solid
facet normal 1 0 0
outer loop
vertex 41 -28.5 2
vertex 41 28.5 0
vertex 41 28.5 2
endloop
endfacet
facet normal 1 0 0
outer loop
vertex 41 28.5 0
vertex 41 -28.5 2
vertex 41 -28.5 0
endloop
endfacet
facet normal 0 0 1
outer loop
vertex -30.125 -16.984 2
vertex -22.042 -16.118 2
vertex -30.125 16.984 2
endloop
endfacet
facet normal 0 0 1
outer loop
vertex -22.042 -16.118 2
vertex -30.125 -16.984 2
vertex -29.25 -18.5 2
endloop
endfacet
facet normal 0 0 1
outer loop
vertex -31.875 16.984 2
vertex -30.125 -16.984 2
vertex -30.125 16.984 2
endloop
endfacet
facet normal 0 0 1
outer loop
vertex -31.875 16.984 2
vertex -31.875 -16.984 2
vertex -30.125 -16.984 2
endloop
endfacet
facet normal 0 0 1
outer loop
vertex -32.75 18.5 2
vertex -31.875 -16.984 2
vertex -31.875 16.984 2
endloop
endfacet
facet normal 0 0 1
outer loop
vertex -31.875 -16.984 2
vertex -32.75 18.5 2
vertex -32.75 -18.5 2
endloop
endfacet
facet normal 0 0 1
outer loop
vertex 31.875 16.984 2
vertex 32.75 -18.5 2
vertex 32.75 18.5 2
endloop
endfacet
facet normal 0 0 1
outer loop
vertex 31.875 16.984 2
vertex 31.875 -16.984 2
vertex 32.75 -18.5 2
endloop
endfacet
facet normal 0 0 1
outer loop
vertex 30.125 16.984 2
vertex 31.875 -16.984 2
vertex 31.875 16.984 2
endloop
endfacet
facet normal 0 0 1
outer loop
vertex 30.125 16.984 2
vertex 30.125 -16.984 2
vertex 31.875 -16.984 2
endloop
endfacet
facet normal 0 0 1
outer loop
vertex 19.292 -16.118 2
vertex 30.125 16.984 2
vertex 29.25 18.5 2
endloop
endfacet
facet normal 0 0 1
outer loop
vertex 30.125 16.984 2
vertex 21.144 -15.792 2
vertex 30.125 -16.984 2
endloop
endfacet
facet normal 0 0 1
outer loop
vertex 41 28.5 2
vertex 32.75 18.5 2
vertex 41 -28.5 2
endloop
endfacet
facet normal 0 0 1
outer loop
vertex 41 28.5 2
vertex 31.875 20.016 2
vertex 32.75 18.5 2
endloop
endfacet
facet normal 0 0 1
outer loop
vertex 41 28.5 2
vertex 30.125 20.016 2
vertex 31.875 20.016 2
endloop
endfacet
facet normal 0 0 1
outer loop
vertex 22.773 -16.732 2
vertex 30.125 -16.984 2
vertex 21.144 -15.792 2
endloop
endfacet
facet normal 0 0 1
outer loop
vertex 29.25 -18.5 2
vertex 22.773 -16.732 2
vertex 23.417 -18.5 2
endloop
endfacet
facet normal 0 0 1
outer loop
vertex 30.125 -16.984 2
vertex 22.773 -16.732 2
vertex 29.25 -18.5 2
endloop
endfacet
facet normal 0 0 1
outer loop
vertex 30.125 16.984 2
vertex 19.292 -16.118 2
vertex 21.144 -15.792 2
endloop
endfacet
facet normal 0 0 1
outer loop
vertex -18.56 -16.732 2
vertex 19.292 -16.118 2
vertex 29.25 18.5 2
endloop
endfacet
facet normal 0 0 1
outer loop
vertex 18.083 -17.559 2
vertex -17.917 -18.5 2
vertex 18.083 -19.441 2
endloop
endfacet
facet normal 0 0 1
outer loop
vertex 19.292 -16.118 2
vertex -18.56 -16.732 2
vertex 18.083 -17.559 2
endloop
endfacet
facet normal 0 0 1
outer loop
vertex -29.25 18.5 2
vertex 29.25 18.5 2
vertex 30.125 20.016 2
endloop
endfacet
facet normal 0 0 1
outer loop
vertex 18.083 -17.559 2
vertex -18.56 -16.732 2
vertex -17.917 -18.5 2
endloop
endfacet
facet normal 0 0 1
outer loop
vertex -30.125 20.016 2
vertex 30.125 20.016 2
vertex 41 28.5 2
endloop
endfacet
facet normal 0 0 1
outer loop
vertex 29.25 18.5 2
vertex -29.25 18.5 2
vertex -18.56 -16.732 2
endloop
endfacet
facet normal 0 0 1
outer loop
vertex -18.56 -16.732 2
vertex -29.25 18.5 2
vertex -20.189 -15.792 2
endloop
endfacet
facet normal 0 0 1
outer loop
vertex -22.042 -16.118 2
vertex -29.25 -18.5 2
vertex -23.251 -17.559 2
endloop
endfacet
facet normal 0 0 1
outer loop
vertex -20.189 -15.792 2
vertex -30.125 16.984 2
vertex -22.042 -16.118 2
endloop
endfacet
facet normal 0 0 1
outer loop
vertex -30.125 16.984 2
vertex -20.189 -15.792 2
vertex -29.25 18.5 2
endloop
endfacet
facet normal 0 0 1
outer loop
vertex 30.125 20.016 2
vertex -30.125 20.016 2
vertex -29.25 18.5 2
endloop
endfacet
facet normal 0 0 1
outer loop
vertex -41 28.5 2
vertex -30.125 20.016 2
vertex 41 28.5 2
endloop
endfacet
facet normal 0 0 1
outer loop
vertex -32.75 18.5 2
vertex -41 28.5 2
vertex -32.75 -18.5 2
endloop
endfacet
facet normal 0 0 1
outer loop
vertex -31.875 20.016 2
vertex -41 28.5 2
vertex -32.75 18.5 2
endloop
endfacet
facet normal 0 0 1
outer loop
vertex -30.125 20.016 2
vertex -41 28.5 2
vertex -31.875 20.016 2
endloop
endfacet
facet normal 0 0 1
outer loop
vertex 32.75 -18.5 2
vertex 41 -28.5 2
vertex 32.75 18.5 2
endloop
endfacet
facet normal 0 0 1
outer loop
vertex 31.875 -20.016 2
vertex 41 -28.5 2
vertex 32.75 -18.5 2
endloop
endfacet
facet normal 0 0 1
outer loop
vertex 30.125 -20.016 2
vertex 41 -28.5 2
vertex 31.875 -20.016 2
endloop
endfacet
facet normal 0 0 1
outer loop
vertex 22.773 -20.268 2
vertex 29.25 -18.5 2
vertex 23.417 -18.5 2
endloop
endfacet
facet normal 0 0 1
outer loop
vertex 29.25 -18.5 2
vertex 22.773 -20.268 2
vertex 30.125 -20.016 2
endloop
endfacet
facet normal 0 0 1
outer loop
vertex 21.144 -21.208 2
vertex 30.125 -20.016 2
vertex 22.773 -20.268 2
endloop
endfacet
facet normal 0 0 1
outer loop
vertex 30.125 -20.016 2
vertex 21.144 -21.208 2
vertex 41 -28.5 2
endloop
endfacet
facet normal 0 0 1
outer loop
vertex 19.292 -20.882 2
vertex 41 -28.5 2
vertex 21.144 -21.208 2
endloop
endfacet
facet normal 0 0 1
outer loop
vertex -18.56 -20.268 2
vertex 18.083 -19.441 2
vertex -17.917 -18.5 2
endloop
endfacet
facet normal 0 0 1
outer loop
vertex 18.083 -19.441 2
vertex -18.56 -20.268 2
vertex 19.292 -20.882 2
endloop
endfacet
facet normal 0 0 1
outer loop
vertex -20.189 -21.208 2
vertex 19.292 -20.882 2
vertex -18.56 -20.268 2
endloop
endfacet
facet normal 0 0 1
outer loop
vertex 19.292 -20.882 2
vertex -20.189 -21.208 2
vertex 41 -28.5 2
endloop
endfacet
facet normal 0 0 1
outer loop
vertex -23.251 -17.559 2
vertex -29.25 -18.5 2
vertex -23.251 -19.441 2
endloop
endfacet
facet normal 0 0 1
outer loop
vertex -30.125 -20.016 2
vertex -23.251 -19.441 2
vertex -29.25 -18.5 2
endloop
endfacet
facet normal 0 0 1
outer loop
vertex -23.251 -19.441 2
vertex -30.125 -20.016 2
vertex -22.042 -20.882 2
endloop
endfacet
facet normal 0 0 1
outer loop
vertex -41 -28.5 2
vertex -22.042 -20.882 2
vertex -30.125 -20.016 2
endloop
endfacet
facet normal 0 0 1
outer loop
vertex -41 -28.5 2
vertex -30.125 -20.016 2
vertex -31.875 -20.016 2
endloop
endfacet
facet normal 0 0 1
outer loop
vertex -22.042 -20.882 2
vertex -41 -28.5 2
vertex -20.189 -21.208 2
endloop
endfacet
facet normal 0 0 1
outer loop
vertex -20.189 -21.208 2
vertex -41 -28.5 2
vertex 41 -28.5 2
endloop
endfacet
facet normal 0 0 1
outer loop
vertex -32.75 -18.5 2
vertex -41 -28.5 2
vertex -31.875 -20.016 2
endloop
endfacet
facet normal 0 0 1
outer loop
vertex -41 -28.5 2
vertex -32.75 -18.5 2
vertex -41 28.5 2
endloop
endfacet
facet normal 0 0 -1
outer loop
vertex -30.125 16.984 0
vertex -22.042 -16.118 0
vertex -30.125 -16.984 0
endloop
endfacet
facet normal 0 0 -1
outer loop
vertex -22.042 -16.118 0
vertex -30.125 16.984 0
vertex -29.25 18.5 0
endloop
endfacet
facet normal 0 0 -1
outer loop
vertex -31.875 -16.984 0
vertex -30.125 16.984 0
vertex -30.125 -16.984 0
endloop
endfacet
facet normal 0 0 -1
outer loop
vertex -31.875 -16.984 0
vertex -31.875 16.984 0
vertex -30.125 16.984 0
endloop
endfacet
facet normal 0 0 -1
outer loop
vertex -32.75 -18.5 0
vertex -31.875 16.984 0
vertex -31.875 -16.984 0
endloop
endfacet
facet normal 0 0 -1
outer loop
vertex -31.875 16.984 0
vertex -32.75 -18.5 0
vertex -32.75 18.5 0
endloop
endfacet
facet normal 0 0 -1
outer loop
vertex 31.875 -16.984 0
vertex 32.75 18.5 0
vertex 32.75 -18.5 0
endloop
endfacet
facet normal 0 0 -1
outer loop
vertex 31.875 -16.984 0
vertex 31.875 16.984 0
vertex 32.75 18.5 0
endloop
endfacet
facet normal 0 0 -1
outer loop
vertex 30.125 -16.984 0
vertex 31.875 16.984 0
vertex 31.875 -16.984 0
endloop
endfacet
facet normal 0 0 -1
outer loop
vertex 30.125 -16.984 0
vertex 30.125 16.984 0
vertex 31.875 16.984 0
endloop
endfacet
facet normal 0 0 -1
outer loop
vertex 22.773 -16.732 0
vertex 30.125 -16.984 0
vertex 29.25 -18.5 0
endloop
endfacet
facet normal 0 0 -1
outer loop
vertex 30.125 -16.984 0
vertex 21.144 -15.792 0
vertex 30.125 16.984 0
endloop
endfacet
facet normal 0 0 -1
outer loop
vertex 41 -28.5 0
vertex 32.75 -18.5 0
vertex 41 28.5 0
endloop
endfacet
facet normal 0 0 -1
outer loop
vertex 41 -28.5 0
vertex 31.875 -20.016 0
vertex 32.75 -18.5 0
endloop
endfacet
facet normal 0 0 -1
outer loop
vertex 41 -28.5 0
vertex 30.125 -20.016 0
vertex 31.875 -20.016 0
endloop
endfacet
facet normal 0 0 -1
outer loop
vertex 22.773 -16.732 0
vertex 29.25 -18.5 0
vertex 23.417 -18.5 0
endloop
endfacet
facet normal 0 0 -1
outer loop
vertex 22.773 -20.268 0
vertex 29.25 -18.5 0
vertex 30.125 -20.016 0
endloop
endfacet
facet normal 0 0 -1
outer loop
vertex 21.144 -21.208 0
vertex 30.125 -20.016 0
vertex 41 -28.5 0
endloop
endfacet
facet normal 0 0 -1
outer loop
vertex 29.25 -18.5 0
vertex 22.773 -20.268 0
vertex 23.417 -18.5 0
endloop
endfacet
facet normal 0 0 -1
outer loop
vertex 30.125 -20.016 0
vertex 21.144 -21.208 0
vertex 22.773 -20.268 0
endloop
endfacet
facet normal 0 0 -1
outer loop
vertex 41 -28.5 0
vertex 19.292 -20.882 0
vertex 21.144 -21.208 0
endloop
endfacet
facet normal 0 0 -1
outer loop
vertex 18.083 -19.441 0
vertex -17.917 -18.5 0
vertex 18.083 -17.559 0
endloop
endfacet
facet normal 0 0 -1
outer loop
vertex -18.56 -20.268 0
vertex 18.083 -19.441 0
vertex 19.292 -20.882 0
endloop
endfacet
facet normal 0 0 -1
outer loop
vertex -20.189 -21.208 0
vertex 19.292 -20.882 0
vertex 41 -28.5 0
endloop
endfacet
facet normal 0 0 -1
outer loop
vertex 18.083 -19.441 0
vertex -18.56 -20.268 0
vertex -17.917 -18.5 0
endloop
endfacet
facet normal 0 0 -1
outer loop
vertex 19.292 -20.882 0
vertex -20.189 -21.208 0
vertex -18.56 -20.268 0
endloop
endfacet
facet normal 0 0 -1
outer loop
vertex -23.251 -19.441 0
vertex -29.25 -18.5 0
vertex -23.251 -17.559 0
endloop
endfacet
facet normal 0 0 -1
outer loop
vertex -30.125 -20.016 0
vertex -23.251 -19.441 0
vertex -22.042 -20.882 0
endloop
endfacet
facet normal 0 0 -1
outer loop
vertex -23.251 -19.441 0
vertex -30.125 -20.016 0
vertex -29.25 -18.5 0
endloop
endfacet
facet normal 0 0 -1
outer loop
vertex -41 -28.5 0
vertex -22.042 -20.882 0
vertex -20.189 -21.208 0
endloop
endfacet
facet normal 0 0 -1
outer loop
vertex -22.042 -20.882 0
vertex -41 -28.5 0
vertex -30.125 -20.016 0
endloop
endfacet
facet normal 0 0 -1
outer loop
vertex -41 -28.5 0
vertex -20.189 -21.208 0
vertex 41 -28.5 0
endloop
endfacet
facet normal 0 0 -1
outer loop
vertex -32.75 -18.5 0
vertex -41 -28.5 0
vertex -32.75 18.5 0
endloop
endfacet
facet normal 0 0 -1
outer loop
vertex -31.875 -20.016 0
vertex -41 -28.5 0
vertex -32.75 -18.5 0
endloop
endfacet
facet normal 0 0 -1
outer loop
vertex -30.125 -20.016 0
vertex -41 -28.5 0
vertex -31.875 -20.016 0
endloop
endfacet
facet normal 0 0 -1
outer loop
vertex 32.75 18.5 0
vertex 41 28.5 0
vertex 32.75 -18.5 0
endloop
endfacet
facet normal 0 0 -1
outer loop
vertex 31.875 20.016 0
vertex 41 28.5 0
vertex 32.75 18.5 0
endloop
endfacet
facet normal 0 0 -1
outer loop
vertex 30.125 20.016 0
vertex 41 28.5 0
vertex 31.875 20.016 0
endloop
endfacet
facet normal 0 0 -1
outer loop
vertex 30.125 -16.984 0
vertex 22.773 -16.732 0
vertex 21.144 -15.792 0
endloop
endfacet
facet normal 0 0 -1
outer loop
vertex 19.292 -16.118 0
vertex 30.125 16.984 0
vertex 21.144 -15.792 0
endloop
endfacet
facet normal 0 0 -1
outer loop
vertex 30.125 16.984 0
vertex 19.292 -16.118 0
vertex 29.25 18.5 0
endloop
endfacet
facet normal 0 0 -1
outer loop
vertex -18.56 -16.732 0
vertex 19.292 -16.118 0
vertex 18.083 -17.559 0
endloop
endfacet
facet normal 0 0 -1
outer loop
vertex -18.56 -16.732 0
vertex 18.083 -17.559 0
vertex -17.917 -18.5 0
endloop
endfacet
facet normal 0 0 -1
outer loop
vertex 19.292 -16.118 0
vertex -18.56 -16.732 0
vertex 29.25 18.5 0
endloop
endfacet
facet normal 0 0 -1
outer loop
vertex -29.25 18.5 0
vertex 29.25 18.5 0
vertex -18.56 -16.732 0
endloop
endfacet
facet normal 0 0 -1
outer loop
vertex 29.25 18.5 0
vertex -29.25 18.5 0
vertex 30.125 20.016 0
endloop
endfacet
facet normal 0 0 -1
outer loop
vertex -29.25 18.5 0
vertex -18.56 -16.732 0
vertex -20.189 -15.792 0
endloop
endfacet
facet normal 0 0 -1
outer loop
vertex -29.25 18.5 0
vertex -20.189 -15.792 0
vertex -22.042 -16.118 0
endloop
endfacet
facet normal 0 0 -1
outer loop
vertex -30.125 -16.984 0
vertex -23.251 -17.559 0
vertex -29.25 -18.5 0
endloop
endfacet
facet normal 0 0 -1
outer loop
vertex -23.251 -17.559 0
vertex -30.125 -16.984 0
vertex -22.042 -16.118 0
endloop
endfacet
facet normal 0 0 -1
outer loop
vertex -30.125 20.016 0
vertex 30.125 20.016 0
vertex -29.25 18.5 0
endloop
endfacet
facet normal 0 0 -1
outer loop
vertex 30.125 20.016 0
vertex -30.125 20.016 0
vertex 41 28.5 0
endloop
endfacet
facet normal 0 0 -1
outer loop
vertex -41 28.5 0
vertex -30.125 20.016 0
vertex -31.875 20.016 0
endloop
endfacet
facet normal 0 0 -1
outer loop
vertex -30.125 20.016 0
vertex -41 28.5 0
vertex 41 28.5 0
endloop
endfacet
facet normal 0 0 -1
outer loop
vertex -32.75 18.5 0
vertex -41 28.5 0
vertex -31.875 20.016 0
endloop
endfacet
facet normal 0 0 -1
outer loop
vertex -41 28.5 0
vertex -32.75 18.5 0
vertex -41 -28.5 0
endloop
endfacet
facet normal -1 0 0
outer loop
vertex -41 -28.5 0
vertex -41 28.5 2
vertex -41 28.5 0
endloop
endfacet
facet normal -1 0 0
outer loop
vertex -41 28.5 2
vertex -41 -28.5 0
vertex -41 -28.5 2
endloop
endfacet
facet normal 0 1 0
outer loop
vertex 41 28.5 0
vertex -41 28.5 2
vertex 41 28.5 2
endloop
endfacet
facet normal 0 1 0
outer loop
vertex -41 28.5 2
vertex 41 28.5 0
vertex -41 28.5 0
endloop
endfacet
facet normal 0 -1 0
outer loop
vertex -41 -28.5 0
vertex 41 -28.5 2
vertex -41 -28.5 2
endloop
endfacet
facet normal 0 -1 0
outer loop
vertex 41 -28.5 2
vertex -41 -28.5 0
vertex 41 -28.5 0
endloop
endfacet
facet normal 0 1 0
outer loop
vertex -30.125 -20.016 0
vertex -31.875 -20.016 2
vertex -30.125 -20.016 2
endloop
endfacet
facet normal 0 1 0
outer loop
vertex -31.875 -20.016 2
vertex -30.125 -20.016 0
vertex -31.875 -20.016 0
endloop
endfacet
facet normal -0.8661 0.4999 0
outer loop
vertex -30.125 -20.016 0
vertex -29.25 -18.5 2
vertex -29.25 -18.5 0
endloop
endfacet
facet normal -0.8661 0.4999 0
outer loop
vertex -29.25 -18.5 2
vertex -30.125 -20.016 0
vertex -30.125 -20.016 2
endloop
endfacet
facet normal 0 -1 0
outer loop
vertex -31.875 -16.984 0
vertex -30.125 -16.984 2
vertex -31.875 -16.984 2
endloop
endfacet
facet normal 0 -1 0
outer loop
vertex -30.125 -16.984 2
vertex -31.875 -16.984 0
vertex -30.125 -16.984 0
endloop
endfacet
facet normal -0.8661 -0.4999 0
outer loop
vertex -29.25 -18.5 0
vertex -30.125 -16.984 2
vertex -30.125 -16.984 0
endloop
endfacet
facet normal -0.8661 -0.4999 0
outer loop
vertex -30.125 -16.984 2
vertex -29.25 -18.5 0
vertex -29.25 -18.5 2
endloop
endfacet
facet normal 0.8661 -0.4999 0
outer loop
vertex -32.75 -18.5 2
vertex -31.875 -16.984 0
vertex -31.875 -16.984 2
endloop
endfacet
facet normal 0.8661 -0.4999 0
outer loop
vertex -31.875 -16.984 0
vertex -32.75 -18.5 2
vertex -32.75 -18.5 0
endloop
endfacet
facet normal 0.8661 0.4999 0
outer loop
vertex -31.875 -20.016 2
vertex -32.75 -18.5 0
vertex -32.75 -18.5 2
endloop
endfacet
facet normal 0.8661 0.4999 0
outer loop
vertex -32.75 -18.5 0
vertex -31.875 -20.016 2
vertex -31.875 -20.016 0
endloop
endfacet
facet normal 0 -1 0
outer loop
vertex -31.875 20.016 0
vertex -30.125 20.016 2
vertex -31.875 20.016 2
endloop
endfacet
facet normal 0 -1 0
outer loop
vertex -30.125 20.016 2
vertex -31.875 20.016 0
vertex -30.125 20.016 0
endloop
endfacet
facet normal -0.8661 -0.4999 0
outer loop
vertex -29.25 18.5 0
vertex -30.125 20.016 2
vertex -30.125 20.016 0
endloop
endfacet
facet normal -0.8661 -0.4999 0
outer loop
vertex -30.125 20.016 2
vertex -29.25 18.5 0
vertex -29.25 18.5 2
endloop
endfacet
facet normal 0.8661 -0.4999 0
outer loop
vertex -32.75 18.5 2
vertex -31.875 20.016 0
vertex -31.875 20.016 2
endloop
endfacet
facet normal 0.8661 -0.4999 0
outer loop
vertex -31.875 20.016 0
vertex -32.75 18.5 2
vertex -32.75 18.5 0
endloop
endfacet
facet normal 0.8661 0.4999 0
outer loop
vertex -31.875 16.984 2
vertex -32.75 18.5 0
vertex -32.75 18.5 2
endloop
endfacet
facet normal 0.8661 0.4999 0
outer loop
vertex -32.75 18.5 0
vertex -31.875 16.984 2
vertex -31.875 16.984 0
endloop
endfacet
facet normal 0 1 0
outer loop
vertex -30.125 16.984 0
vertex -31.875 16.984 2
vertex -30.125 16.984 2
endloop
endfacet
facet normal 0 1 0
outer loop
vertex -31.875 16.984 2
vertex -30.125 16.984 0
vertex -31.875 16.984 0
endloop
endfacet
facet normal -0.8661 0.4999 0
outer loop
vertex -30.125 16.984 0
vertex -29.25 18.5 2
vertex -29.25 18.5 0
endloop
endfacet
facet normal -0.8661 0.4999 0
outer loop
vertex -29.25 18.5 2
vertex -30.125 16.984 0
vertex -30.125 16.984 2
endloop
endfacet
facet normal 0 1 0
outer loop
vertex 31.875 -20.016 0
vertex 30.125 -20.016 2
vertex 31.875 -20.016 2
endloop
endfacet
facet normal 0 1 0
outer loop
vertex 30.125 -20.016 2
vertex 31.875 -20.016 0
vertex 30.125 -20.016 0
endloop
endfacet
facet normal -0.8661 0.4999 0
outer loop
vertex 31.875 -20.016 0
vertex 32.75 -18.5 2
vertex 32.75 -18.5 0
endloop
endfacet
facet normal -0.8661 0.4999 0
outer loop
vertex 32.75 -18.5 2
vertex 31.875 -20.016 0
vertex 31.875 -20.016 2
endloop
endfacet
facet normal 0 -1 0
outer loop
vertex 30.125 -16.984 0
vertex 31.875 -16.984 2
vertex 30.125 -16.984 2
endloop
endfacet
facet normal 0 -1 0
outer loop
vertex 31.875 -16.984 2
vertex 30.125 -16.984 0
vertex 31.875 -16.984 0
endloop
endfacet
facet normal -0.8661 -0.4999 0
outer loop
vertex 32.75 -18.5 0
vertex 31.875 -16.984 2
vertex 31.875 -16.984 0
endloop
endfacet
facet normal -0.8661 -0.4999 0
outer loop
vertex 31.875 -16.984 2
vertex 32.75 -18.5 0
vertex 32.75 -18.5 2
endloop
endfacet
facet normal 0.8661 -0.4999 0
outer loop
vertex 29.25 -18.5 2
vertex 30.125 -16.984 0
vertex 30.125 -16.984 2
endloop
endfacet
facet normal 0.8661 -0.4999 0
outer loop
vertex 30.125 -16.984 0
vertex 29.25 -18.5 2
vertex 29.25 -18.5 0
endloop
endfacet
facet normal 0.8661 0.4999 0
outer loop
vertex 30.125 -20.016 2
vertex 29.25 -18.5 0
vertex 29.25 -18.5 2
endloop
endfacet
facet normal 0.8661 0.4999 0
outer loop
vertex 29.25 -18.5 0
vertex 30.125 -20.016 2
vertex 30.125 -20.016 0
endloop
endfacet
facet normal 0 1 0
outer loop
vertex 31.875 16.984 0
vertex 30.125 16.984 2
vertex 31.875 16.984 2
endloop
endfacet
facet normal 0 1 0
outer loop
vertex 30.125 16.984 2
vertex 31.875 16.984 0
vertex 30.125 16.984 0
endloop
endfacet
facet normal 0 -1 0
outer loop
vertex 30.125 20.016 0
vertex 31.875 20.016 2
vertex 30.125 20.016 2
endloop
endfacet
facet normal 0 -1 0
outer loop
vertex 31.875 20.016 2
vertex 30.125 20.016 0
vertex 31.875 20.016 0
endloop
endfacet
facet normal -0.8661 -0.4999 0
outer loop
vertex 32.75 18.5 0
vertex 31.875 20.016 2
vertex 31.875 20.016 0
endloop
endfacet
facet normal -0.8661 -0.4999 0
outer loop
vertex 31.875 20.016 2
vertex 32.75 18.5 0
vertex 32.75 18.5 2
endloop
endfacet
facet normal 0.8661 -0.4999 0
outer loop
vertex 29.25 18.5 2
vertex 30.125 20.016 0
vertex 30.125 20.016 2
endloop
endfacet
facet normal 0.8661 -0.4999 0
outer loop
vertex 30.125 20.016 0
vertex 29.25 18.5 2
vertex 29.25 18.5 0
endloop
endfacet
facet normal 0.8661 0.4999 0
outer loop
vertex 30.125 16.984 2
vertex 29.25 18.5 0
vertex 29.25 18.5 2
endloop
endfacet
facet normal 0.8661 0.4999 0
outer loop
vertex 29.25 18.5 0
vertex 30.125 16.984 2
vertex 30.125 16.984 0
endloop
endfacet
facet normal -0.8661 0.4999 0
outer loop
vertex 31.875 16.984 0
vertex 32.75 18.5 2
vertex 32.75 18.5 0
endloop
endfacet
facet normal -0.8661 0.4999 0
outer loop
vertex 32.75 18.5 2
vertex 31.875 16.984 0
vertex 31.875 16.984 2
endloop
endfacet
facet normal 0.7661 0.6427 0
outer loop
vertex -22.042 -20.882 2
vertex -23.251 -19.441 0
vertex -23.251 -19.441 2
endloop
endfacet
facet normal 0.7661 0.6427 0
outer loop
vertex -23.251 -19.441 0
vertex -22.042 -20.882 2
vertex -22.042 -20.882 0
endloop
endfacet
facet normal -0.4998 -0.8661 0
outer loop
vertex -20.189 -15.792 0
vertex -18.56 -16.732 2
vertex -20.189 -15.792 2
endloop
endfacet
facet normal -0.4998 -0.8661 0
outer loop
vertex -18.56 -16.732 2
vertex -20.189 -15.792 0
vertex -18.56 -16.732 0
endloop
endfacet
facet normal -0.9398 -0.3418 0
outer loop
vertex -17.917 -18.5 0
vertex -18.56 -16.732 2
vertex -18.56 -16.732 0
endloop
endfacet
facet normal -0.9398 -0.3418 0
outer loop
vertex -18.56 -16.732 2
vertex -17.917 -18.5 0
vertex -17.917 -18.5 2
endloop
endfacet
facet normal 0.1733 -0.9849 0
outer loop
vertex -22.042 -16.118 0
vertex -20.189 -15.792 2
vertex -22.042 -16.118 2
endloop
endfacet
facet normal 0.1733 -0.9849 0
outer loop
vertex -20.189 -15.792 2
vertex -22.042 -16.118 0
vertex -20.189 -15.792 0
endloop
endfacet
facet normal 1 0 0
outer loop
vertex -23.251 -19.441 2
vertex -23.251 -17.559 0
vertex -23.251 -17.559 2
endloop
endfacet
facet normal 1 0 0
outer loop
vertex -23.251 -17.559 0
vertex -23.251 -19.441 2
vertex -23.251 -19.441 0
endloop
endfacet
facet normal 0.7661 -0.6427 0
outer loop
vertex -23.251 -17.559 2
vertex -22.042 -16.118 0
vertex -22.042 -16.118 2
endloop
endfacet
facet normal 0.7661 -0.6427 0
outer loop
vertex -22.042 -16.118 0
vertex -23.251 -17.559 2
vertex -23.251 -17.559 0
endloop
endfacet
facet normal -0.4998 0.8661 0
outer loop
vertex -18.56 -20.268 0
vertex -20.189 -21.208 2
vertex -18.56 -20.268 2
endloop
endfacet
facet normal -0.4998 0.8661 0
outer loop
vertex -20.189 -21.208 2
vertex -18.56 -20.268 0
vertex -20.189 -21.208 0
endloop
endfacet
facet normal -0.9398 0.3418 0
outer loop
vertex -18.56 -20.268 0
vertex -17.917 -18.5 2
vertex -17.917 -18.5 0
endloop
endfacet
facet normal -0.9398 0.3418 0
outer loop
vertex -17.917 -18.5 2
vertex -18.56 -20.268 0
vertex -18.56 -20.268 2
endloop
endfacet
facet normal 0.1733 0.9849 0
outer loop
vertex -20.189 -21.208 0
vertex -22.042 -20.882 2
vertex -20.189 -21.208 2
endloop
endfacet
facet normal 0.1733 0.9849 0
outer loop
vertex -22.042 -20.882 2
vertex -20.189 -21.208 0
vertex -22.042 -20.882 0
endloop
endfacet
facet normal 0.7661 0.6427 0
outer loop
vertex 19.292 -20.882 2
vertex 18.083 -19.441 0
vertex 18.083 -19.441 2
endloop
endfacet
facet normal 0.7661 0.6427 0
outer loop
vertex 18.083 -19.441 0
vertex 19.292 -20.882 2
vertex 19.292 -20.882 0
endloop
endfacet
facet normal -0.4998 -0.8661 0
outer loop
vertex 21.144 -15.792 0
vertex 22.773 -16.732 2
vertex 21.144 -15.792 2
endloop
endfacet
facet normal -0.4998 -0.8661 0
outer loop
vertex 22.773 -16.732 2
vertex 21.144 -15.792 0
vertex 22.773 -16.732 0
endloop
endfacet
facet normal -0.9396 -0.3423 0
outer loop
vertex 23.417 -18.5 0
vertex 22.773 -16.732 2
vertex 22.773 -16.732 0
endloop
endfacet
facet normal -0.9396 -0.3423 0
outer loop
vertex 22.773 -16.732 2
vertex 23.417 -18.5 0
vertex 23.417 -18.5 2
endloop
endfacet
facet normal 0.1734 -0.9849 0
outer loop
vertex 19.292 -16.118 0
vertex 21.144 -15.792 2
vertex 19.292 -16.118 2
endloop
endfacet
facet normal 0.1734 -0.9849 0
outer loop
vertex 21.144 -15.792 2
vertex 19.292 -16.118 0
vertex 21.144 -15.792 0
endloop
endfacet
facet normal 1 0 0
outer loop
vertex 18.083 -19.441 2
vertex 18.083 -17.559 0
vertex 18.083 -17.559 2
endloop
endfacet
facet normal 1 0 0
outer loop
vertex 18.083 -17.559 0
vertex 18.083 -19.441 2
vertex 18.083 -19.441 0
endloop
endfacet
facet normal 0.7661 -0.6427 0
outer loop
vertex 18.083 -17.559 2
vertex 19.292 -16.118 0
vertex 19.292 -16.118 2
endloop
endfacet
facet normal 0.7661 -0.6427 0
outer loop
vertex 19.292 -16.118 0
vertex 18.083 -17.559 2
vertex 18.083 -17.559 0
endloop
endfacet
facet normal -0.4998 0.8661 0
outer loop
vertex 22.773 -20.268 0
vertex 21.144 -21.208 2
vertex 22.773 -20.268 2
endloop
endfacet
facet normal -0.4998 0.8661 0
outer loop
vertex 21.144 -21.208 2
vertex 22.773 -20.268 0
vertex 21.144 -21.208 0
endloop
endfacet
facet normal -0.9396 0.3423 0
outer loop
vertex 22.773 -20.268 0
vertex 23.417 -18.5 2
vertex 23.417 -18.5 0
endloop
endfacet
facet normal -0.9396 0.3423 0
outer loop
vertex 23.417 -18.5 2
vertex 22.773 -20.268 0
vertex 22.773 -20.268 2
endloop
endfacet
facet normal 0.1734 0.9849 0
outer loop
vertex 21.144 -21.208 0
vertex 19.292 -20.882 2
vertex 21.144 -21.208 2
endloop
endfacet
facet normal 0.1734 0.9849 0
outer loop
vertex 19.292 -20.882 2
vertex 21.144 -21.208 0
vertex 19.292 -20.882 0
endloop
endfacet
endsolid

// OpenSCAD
// Quick-and-dirty plate to mount the Duet 3 tool distribution board to the 2020 frame

// parameters (mm)

plateThickness = 2;

pcbMountXDelta = 62;
pcbMountYDelta = 37;
padding = 10;

pcbMountHoleDiameter = 3.5;
plateMountHoleDiameter = 5.5;

//--------------------

difference() {
    // plate
    translate([-pcbMountXDelta / 2 - padding, -pcbMountYDelta / 2 - padding, 0])
        cube([
            pcbMountXDelta + padding*2,
            pcbMountYDelta + padding*2,
            plateThickness]);
    // pcb mounting holes
    translate([-pcbMountXDelta / 2, -pcbMountYDelta / 2, -1])
        cylinder(h = plateThickness+2, d = pcbMountHoleDiameter);
    translate([-pcbMountXDelta / 2, pcbMountYDelta / 2, -1])
        cylinder(h = plateThickness+2, d = pcbMountHoleDiameter);
    translate([pcbMountXDelta / 2, -pcbMountYDelta / 2, -1])
        cylinder(h = plateThickness+2, d = pcbMountHoleDiameter);
    translate([pcbMountXDelta / 2, pcbMountYDelta / 2, -1])
        cylinder(h = plateThickness+2, d = pcbMountHoleDiameter);

    // plate mounting holes
    translate([-pcbMountXDelta / 3, -pcbMountYDelta / 2, -1])
        cylinder(h = plateThickness+2, d = plateMountHoleDiameter);
    translate([pcbMountXDelta / 3, -pcbMountYDelta / 2, -1])
        cylinder(h = plateThickness+2, d = plateMountHoleDiameter);
}
    
